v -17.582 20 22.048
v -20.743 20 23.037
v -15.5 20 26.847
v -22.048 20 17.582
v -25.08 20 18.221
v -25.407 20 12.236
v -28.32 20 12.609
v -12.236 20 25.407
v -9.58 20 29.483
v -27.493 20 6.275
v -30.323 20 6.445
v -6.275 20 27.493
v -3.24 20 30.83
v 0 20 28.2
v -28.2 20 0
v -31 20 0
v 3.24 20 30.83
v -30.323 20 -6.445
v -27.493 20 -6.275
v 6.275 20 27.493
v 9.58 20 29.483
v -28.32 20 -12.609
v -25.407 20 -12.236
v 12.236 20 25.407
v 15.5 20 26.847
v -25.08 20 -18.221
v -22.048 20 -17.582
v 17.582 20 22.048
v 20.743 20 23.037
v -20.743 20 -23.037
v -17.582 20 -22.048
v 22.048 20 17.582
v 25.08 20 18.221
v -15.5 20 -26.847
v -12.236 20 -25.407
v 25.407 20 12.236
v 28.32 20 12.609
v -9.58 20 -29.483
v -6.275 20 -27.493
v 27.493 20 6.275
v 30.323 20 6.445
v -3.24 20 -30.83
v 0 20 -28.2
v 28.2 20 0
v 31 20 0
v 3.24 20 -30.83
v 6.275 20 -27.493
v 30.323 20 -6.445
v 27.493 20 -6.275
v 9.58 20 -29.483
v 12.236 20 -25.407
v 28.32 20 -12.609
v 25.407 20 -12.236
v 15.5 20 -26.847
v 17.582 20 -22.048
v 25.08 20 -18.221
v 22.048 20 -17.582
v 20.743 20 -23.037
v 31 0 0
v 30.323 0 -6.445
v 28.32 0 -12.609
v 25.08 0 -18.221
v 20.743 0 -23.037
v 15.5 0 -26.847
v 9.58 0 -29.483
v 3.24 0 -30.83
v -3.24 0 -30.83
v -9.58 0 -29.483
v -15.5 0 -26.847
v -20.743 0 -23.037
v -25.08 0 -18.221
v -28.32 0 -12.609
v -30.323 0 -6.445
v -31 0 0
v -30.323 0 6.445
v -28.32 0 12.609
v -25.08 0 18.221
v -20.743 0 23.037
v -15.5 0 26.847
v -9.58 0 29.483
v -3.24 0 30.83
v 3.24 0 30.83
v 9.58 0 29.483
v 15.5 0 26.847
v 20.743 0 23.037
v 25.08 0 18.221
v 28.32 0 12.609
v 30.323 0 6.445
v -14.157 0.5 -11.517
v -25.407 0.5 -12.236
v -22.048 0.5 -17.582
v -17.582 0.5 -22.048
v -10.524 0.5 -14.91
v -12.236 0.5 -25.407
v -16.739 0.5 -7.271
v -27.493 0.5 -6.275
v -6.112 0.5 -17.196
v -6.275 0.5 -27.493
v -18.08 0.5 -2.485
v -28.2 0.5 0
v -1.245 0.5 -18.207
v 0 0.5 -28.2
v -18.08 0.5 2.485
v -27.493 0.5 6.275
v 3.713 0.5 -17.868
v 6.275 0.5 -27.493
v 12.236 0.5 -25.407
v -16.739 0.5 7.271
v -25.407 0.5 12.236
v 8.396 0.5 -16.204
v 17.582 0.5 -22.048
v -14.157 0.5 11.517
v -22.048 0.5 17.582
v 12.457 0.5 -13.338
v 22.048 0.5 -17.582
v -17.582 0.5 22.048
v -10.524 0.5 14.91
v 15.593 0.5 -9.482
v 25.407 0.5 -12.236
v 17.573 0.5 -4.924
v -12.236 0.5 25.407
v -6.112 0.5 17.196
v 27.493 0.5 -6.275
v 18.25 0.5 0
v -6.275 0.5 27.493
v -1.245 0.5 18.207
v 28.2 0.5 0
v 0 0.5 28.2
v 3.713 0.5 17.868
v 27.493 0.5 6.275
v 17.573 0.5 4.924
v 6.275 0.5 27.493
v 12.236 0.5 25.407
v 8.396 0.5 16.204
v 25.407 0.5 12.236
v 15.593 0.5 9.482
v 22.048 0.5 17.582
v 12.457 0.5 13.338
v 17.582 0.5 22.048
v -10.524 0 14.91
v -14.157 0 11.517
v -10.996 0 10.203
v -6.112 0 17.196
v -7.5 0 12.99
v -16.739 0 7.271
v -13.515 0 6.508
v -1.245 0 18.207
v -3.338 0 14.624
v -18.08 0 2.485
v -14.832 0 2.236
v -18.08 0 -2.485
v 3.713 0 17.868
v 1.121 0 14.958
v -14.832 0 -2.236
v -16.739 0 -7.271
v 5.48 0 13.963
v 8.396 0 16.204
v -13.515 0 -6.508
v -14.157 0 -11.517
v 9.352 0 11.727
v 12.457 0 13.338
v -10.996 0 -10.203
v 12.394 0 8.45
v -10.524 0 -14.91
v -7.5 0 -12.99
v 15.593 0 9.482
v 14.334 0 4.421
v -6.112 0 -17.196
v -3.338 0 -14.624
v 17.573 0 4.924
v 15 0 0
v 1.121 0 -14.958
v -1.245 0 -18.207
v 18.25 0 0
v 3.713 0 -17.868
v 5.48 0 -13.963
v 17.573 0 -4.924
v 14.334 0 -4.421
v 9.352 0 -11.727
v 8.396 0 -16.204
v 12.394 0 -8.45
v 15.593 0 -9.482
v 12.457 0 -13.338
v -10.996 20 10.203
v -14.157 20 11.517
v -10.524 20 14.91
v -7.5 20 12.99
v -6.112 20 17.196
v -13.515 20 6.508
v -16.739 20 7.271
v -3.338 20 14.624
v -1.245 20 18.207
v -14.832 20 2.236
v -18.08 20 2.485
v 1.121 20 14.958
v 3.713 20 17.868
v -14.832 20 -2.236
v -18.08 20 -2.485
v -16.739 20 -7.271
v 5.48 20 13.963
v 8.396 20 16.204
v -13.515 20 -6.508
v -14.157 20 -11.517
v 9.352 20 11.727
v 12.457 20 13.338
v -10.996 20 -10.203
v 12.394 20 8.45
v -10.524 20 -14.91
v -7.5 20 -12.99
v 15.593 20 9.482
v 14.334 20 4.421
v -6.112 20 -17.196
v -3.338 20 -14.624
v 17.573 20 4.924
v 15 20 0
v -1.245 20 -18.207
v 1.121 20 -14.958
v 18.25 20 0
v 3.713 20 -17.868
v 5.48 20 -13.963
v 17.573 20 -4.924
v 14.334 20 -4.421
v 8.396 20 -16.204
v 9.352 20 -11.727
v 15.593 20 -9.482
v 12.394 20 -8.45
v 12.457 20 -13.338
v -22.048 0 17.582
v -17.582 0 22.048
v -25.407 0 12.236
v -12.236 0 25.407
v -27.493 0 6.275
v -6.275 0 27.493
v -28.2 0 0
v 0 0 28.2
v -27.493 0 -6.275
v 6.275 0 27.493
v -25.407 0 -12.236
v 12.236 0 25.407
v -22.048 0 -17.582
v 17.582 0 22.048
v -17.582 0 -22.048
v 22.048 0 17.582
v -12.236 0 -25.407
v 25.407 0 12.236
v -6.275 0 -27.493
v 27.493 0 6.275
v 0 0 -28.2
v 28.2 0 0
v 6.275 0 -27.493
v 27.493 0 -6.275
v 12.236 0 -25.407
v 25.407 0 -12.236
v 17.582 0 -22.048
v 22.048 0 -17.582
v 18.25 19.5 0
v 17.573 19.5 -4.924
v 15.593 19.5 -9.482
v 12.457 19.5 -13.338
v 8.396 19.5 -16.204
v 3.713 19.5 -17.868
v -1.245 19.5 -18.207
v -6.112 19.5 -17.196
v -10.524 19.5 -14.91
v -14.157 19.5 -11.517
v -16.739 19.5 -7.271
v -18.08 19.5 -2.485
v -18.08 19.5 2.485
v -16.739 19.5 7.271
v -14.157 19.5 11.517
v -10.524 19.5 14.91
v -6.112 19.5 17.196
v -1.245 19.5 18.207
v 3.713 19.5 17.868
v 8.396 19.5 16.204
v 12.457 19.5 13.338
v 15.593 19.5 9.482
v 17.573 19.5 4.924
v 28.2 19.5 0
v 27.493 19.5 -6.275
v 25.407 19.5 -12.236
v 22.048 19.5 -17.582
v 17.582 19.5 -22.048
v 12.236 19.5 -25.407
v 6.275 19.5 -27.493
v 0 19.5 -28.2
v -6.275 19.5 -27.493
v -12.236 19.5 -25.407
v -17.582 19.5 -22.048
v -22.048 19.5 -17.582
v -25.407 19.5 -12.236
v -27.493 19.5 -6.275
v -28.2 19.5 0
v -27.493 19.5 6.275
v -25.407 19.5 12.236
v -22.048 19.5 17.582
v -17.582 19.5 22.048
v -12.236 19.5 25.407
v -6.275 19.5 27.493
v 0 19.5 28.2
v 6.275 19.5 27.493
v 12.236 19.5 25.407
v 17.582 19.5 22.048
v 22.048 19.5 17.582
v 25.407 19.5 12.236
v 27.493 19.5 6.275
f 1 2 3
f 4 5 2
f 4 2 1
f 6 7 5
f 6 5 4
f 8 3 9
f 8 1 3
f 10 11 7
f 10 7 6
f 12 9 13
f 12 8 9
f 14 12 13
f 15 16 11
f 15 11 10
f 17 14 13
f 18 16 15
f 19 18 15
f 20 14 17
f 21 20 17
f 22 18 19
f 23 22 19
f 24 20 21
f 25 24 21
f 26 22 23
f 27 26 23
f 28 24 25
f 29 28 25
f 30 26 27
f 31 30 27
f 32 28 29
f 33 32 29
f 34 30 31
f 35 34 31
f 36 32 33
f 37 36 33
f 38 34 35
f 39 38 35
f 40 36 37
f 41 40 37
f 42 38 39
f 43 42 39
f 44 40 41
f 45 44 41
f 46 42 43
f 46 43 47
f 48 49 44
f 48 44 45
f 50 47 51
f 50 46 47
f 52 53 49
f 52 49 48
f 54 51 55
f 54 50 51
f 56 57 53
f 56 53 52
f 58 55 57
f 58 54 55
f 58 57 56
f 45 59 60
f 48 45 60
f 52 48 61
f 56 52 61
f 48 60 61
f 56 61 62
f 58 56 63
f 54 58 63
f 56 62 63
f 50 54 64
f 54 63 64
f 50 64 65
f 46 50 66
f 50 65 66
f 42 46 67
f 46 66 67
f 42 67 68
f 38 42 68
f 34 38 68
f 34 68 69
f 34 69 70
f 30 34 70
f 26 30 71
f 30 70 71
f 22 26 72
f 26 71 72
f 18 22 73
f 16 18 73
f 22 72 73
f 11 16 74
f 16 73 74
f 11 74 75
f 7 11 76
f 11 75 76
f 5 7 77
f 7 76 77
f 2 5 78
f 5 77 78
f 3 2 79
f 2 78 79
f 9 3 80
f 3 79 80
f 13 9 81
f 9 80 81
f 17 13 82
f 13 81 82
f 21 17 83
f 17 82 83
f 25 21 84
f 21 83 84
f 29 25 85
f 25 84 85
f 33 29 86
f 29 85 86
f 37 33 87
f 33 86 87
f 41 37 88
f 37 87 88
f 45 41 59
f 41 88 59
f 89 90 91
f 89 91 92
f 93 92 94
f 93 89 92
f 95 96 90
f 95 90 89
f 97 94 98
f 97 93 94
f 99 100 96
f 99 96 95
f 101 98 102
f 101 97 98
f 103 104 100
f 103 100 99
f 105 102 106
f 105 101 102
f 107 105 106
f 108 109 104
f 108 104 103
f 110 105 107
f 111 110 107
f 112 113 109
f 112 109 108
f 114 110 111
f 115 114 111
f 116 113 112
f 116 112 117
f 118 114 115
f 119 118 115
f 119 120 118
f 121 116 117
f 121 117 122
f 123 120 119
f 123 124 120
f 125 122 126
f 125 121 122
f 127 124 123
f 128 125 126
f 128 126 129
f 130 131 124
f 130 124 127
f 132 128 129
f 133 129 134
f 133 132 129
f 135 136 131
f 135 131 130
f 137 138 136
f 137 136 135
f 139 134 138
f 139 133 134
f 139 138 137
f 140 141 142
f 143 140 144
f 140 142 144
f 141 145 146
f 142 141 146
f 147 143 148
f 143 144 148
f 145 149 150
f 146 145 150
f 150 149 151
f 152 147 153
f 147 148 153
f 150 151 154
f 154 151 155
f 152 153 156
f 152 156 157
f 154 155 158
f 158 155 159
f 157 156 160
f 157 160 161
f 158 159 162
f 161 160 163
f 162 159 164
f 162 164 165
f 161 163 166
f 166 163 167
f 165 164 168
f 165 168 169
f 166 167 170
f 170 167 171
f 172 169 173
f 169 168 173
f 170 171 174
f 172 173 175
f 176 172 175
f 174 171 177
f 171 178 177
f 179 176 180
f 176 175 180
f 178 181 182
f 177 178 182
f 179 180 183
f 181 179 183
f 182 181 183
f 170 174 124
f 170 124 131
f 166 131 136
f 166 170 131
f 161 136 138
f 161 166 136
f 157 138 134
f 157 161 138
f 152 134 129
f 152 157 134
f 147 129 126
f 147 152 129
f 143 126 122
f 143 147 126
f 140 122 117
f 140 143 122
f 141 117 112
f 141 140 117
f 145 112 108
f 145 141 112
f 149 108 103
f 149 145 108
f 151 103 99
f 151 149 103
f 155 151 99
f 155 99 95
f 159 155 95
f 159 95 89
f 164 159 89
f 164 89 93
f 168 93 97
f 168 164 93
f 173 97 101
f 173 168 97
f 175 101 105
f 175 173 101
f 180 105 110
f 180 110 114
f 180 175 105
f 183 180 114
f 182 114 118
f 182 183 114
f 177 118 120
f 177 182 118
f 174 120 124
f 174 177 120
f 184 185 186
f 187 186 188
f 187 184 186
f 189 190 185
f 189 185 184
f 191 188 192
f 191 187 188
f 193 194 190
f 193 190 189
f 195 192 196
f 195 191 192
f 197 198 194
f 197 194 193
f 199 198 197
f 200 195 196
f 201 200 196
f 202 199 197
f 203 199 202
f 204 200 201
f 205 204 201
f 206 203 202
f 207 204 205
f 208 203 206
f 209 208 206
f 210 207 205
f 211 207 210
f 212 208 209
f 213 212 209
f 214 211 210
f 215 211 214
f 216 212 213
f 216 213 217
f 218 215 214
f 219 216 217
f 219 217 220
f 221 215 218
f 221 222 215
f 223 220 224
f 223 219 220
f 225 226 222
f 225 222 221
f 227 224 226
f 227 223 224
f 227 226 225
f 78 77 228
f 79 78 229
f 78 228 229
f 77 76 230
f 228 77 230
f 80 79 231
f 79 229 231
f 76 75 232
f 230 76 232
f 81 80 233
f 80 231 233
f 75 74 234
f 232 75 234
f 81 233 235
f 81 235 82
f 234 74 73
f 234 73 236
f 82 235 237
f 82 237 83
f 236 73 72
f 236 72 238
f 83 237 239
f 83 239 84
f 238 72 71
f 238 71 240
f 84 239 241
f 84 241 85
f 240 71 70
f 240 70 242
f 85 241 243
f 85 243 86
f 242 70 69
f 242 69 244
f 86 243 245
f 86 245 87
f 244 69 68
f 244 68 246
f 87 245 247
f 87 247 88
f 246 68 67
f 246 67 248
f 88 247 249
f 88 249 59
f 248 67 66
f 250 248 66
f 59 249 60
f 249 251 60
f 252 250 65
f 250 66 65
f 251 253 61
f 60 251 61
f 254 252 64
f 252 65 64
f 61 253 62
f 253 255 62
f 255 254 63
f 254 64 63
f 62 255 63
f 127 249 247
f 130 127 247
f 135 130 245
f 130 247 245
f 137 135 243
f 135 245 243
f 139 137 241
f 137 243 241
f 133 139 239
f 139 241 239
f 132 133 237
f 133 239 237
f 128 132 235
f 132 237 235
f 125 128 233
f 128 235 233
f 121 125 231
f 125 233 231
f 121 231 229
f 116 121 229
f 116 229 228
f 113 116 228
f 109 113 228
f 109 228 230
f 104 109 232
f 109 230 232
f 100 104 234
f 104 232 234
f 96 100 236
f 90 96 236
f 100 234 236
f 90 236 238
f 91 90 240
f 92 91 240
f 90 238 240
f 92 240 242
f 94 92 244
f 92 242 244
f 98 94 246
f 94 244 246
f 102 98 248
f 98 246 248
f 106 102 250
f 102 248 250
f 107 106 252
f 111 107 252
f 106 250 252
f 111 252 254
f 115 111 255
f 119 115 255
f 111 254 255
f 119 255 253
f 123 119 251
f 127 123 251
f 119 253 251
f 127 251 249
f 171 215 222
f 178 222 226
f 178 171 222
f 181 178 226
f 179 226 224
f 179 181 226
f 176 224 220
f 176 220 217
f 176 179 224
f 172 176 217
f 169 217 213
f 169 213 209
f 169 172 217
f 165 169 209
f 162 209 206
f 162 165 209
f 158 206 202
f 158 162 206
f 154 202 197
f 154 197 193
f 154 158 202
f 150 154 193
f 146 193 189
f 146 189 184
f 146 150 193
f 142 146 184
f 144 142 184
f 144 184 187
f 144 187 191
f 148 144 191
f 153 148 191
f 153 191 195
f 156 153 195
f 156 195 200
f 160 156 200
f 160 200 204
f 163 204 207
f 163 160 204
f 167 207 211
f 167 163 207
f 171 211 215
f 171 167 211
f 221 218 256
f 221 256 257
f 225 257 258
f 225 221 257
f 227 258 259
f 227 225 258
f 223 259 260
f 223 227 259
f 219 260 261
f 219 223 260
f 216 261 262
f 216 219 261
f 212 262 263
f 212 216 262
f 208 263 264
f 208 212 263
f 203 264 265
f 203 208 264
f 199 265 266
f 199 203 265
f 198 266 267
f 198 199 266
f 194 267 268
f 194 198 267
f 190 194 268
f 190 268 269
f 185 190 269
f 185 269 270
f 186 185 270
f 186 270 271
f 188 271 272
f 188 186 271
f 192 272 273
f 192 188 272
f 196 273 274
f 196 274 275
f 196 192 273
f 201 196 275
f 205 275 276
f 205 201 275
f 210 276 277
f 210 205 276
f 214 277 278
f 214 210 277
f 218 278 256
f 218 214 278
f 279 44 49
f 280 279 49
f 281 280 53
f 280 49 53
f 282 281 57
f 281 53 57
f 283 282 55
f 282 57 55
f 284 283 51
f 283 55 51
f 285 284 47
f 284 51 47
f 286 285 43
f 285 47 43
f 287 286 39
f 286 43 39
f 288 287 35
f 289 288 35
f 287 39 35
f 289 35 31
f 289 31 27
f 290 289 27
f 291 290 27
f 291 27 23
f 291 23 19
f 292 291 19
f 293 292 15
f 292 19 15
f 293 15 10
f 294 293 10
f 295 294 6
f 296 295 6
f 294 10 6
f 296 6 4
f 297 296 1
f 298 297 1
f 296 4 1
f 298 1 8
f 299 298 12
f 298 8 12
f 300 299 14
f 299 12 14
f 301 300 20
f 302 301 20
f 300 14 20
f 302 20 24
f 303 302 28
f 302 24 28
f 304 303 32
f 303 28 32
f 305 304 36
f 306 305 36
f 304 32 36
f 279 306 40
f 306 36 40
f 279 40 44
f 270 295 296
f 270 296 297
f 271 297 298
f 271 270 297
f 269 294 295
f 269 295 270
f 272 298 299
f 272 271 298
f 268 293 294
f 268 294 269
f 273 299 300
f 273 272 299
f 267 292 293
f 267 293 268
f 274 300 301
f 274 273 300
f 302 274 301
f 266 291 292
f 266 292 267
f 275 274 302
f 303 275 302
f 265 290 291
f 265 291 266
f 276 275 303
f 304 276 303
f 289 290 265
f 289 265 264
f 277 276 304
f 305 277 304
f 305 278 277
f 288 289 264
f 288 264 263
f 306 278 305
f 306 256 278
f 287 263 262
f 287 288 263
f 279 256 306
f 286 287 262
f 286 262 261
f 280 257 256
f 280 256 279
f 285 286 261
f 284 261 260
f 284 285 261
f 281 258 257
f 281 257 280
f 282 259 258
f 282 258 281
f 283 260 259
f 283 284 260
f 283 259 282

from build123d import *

# Parameters (mm, degrees)
SKETCH1_R           = 31
SKETCH1_R_2         = 15
BOSS_EXTRUDE1_DEPTH = 20
SKETCH2_R           = 28.2
SKETCH2_R_2         = 18.25
CUT_EXTRUDE1_DEPTH  = 0.5
SKETCH3_R           = 28.2
SKETCH3_R_2         = 18.25
CUT_EXTRUDE2_DEPTH  = 0.5


with BuildPart() as part:
    # Sketch1 → Boss-Extrude1 (new body)
    with BuildSketch(Plane(origin=(0, 0, 0), x_dir=(1, 0, 0), z_dir=(0, 1, 0))):
        Circle(SKETCH1_R)
        Circle(SKETCH1_R_2, mode=Mode.SUBTRACT)
    extrude(amount=BOSS_EXTRUDE1_DEPTH)

    # Sketch2 → Cut-Extrude1 (cut)
    with BuildSketch(Plane(origin=(0, 20, 0), x_dir=(1, 0, 0), z_dir=(0, 1, 0))):
        Circle(SKETCH2_R)
        Circle(SKETCH2_R_2, mode=Mode.SUBTRACT)
    extrude(amount=-CUT_EXTRUDE1_DEPTH, mode=Mode.SUBTRACT)

    # Sketch3 → Cut-Extrude2 (cut)
    with BuildSketch(Plane.XZ):
        Circle(SKETCH3_R)
        Circle(SKETCH3_R_2, mode=Mode.SUBTRACT)
    extrude(amount=-CUT_EXTRUDE2_DEPTH, mode=Mode.SUBTRACT)


solid = part.part
